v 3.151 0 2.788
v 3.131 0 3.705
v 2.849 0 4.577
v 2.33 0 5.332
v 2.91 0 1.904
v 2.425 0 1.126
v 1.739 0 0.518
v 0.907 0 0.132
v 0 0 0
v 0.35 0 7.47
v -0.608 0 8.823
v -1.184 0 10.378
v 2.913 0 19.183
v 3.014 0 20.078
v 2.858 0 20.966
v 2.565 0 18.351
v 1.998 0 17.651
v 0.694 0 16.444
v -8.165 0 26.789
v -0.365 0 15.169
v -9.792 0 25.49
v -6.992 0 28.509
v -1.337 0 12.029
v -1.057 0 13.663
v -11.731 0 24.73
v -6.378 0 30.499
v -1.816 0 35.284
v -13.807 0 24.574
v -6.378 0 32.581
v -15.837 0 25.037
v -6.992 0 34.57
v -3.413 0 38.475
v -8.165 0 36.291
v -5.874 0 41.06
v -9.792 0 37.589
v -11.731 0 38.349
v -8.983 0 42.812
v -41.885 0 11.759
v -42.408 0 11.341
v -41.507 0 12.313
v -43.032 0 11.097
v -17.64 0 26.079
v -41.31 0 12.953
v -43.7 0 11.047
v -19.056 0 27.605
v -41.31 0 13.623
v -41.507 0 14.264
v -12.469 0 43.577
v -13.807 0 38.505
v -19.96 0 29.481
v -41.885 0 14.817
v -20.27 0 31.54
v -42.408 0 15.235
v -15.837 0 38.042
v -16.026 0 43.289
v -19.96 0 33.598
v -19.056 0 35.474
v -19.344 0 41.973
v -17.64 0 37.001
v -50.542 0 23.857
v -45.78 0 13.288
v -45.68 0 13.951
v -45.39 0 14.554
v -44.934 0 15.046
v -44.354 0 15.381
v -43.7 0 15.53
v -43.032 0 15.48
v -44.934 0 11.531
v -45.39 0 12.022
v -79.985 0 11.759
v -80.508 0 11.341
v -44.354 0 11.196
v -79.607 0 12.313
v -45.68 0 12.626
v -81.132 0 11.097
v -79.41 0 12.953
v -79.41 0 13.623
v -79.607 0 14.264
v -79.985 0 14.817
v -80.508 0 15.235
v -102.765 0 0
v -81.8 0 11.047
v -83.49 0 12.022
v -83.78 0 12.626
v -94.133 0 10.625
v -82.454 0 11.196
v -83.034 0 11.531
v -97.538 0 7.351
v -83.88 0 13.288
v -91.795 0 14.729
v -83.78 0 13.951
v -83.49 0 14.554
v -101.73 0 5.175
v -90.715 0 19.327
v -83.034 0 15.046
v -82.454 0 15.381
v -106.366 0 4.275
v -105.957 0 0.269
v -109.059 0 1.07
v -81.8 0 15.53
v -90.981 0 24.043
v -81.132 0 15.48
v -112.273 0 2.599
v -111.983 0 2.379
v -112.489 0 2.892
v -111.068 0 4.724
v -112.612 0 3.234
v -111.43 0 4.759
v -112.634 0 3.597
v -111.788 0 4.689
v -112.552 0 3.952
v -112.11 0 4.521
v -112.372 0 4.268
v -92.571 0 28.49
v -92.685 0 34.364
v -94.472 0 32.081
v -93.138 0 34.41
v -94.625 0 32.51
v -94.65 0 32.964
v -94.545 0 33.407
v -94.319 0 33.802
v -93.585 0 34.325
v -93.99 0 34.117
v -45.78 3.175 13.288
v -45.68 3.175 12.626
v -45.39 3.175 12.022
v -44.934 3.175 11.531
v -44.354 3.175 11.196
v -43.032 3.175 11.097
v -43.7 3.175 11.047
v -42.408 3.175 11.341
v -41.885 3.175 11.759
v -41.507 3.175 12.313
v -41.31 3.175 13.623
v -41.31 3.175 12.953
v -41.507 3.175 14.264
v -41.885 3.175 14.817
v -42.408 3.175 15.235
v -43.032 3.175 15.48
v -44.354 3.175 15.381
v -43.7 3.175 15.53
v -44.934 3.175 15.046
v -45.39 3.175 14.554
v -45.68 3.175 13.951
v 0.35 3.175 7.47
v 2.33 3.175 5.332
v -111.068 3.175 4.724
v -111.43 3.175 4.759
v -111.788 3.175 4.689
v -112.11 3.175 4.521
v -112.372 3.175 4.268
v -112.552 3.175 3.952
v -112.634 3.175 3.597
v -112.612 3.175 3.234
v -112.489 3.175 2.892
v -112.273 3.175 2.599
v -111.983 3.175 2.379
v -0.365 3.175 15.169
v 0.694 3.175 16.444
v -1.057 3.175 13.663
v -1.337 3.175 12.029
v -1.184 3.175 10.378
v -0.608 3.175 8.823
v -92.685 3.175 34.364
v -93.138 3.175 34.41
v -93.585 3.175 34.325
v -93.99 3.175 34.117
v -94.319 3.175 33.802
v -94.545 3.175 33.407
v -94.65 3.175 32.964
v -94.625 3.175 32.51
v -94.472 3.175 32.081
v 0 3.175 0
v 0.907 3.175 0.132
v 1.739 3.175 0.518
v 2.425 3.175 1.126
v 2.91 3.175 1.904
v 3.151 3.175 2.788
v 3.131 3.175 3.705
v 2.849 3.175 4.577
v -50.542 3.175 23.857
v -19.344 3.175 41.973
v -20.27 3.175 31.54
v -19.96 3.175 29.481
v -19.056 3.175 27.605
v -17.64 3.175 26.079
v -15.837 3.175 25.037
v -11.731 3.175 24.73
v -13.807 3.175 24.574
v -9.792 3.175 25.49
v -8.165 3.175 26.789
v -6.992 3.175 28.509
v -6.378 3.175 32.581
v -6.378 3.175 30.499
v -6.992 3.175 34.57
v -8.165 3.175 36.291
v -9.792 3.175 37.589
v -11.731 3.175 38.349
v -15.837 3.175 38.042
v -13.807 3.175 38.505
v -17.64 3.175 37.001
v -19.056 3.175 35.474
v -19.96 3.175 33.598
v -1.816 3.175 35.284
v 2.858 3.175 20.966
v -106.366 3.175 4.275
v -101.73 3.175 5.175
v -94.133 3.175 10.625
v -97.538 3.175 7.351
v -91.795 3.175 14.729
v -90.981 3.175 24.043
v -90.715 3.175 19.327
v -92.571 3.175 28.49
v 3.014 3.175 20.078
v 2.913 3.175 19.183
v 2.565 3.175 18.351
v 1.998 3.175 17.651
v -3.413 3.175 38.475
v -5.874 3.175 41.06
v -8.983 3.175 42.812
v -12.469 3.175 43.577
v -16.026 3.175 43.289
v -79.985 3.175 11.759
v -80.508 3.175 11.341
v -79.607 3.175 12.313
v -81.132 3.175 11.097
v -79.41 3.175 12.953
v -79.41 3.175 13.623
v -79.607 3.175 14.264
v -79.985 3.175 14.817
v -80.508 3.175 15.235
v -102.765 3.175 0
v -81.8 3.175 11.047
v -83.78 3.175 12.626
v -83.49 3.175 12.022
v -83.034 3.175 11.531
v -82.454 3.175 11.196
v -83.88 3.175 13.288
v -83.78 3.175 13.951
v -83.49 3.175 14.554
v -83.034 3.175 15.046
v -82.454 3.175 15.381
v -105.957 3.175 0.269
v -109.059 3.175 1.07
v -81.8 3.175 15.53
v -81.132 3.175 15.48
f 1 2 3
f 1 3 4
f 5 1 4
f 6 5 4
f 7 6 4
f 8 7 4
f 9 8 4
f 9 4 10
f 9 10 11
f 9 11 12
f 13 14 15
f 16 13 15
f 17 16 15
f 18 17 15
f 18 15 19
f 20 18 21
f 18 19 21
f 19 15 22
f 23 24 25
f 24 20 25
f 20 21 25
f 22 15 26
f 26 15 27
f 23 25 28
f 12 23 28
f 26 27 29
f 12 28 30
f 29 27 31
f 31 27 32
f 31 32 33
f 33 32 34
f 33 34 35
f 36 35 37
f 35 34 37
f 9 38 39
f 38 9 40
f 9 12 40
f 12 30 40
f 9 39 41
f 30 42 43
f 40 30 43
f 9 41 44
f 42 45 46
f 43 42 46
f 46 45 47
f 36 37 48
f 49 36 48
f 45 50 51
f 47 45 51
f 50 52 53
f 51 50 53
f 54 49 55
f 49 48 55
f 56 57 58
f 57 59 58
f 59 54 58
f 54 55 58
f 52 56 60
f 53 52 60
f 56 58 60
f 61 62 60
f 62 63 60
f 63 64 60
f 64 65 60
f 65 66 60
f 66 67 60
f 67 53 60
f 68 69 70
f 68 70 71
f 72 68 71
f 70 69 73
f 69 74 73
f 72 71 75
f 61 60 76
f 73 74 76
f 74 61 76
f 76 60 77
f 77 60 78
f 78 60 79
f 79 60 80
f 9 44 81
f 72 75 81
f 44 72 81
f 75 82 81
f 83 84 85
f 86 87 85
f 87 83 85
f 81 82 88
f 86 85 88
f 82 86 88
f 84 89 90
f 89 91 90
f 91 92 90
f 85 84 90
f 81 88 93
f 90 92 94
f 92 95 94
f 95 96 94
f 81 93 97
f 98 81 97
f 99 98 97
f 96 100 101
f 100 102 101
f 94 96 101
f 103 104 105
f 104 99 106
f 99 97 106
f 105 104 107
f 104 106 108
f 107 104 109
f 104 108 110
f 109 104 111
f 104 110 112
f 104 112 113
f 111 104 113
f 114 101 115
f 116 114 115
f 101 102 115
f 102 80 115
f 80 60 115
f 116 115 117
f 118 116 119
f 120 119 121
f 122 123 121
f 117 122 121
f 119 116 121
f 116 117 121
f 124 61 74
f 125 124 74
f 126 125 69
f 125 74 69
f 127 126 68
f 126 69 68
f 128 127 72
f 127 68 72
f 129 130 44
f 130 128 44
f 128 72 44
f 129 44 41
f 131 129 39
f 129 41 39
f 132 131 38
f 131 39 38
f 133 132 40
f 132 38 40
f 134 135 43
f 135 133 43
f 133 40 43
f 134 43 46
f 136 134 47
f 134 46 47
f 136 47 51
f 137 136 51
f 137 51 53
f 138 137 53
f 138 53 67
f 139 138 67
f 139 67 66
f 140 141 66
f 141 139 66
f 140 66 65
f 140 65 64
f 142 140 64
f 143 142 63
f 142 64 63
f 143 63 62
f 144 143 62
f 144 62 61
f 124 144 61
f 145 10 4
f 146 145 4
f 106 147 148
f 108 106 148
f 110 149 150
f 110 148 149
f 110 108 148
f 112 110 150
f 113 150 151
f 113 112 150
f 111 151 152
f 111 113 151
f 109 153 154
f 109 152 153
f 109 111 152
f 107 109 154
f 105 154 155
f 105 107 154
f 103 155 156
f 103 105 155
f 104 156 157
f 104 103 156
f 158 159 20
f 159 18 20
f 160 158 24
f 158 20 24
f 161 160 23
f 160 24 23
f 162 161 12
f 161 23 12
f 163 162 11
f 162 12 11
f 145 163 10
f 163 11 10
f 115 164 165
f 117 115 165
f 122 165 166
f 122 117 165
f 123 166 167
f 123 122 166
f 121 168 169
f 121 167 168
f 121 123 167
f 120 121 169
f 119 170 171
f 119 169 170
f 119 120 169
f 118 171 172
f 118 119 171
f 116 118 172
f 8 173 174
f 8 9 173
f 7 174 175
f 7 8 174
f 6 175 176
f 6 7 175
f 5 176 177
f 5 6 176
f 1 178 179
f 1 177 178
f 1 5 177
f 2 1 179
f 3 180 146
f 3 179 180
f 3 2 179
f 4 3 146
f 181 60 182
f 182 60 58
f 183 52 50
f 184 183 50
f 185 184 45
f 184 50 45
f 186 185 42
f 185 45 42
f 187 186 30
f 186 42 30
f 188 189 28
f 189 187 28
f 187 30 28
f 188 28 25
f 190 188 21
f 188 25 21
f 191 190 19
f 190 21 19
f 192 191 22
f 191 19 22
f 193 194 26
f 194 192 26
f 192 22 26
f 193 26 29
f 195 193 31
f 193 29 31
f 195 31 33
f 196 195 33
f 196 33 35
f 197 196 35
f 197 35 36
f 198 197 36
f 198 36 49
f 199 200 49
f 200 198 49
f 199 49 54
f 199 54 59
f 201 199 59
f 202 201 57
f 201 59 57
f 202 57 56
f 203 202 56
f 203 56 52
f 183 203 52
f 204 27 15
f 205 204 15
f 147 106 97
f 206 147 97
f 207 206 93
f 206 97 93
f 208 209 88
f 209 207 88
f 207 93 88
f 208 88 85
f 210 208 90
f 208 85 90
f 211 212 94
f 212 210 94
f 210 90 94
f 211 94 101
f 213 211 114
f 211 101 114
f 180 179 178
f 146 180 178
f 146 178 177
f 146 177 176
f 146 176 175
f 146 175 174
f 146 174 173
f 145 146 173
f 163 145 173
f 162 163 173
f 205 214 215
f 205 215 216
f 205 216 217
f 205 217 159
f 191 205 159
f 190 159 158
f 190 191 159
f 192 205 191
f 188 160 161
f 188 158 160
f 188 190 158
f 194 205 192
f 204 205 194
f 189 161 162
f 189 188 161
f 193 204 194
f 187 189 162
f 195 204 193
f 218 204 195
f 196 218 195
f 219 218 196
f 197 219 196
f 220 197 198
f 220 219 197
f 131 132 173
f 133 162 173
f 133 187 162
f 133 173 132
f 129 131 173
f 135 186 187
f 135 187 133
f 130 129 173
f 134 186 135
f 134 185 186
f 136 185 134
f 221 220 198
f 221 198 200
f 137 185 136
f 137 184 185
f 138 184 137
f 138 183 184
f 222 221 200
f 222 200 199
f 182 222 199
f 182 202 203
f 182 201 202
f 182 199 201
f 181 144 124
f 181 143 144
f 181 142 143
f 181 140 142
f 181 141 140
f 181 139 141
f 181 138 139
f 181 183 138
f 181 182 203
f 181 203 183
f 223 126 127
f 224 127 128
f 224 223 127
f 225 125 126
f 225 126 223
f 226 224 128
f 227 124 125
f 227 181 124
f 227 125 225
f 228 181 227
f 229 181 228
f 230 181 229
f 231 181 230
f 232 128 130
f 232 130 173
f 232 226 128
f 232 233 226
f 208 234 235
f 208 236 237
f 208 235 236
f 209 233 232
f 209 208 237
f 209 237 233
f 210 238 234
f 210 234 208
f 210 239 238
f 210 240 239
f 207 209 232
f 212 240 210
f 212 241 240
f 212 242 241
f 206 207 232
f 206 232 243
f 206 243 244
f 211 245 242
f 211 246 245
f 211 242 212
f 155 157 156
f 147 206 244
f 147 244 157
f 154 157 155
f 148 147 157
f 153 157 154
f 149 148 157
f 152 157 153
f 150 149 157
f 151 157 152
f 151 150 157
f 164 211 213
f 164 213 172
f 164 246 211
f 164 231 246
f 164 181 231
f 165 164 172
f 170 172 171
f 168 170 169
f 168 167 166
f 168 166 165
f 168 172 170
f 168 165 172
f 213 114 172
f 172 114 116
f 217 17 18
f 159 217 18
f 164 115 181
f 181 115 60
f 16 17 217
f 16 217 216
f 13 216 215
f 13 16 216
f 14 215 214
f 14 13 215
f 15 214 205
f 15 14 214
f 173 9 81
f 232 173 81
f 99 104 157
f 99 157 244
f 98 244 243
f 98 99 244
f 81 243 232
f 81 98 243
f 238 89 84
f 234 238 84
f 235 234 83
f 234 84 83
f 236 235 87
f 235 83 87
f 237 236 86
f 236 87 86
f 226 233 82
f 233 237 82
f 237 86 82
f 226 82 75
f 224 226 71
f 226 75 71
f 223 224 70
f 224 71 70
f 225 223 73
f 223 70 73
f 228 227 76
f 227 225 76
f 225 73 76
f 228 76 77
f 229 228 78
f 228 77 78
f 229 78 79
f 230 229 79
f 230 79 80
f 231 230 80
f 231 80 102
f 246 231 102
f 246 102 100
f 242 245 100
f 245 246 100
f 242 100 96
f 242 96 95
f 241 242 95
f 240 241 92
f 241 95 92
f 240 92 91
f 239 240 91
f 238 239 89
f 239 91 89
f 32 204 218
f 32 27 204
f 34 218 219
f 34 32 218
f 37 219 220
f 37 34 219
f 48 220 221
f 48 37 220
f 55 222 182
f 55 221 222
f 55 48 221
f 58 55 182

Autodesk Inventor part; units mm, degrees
ref_plane "YZ Plane" through (0, 0, 0) normal (1, 0, 0) x (0, 1, 0)
ref_plane "XZ Plane" through (0, 0, 0) normal (0, 1, 0) x (-1, 0, 0)
ref_plane "XY Plane" through (0, 0, 0) normal (0, 0, 1) x (1, 0, 0)
sketch "Sketch1" plane through (0, 0, 0) normal (0, 1, 0) x (-1, 0, 0)
  line L0 (1.8157, 35.2839) -> (-2.8584, 20.966)
  arc A0 (-2.8584, 20.966) -> (-1.9975, 17.6511) centre (0.1598, 19.9807) ccw
  line L1 (-1.9975, 17.6511) -> (-0.6941, 16.4441)
  arc A1 (-0.3495, 7.4705) -> (-0.6941, 16.4441) centre (-5.0086, 11.785) ccw
  line L2 (-0.3495, 7.4705) -> (-2.3296, 5.3323)
  arc A2 (-2.3296, 5.3323) -> (0, 0) centre (0, 3.175) ccw
  line L3 (0, 0) -> (102.7651, 0)
  arc A3 (102.7651, 0) -> (111.9831, 2.3787) centre (102.7651, 19.05) ccw
  arc A4 (111.9831, 2.3787) -> (111.0681, 4.7241) centre (111.3685, 3.4901) ccw
  arc A5 (92.5709, 28.4903) -> (111.0681, 4.7241) centre (107.1622, 20.7654) ccw
  line L4 (92.5709, 28.4903) -> (94.4719, 32.0811)
  arc A6 (94.4719, 32.0811) -> (92.6849, 34.3642) centre (93.0689, 32.8239) ccw
  line L5 (92.6849, 34.3642) -> (50.542, 23.8568)
  line L6 (50.542, 23.8568) -> (19.3436, 41.9732)
  arc A7 (19.3436, 41.9732) -> (1.8157, 35.2839) centre (13.285, 31.5396) ccw
  circle A8 centre (43.5324, 13.2882) radius 2.2479
  circle A9 centre (81.6324, 13.2882) radius 2.2479
  circle A10 centre (13.285, 31.5396) radius 6.985
  point P0 (0, 0)
  point P1 (19.3436, 41.9732)
  point P2 (-1.9975, 17.6511)
  point P3 (-0.6941, 16.4441)
  point P4 (0, 0)
  point P5 (111.9831, 2.3787)
  point P6 (111.0681, 4.7241)
extrude "Plate1" add sketch "Sketch1" along normal blind 3.175
equation "\"d0\" = Thickness"
equation "\"BendRadius\" = Thickness"
equation "\"BendReliefWidth\" = Thickness"
equation "\"BendReliefDepth\" = 0.5 * Thickness"
equation "\"CornerReliefSize\" = 4 * Thickness"
equation "\"MinimumRemnant\" = 2 * Thickness"
equation "\"TransitionRadius\" = BendRadius"
equation "\"JacobiRadiusSize\" = BendRadius"
equation "\"GapSize\" = Thickness"
equation "\"Thickness\" = 3.175"
properties part number "hook-bottom-plate" material "Aluminum 6061"
